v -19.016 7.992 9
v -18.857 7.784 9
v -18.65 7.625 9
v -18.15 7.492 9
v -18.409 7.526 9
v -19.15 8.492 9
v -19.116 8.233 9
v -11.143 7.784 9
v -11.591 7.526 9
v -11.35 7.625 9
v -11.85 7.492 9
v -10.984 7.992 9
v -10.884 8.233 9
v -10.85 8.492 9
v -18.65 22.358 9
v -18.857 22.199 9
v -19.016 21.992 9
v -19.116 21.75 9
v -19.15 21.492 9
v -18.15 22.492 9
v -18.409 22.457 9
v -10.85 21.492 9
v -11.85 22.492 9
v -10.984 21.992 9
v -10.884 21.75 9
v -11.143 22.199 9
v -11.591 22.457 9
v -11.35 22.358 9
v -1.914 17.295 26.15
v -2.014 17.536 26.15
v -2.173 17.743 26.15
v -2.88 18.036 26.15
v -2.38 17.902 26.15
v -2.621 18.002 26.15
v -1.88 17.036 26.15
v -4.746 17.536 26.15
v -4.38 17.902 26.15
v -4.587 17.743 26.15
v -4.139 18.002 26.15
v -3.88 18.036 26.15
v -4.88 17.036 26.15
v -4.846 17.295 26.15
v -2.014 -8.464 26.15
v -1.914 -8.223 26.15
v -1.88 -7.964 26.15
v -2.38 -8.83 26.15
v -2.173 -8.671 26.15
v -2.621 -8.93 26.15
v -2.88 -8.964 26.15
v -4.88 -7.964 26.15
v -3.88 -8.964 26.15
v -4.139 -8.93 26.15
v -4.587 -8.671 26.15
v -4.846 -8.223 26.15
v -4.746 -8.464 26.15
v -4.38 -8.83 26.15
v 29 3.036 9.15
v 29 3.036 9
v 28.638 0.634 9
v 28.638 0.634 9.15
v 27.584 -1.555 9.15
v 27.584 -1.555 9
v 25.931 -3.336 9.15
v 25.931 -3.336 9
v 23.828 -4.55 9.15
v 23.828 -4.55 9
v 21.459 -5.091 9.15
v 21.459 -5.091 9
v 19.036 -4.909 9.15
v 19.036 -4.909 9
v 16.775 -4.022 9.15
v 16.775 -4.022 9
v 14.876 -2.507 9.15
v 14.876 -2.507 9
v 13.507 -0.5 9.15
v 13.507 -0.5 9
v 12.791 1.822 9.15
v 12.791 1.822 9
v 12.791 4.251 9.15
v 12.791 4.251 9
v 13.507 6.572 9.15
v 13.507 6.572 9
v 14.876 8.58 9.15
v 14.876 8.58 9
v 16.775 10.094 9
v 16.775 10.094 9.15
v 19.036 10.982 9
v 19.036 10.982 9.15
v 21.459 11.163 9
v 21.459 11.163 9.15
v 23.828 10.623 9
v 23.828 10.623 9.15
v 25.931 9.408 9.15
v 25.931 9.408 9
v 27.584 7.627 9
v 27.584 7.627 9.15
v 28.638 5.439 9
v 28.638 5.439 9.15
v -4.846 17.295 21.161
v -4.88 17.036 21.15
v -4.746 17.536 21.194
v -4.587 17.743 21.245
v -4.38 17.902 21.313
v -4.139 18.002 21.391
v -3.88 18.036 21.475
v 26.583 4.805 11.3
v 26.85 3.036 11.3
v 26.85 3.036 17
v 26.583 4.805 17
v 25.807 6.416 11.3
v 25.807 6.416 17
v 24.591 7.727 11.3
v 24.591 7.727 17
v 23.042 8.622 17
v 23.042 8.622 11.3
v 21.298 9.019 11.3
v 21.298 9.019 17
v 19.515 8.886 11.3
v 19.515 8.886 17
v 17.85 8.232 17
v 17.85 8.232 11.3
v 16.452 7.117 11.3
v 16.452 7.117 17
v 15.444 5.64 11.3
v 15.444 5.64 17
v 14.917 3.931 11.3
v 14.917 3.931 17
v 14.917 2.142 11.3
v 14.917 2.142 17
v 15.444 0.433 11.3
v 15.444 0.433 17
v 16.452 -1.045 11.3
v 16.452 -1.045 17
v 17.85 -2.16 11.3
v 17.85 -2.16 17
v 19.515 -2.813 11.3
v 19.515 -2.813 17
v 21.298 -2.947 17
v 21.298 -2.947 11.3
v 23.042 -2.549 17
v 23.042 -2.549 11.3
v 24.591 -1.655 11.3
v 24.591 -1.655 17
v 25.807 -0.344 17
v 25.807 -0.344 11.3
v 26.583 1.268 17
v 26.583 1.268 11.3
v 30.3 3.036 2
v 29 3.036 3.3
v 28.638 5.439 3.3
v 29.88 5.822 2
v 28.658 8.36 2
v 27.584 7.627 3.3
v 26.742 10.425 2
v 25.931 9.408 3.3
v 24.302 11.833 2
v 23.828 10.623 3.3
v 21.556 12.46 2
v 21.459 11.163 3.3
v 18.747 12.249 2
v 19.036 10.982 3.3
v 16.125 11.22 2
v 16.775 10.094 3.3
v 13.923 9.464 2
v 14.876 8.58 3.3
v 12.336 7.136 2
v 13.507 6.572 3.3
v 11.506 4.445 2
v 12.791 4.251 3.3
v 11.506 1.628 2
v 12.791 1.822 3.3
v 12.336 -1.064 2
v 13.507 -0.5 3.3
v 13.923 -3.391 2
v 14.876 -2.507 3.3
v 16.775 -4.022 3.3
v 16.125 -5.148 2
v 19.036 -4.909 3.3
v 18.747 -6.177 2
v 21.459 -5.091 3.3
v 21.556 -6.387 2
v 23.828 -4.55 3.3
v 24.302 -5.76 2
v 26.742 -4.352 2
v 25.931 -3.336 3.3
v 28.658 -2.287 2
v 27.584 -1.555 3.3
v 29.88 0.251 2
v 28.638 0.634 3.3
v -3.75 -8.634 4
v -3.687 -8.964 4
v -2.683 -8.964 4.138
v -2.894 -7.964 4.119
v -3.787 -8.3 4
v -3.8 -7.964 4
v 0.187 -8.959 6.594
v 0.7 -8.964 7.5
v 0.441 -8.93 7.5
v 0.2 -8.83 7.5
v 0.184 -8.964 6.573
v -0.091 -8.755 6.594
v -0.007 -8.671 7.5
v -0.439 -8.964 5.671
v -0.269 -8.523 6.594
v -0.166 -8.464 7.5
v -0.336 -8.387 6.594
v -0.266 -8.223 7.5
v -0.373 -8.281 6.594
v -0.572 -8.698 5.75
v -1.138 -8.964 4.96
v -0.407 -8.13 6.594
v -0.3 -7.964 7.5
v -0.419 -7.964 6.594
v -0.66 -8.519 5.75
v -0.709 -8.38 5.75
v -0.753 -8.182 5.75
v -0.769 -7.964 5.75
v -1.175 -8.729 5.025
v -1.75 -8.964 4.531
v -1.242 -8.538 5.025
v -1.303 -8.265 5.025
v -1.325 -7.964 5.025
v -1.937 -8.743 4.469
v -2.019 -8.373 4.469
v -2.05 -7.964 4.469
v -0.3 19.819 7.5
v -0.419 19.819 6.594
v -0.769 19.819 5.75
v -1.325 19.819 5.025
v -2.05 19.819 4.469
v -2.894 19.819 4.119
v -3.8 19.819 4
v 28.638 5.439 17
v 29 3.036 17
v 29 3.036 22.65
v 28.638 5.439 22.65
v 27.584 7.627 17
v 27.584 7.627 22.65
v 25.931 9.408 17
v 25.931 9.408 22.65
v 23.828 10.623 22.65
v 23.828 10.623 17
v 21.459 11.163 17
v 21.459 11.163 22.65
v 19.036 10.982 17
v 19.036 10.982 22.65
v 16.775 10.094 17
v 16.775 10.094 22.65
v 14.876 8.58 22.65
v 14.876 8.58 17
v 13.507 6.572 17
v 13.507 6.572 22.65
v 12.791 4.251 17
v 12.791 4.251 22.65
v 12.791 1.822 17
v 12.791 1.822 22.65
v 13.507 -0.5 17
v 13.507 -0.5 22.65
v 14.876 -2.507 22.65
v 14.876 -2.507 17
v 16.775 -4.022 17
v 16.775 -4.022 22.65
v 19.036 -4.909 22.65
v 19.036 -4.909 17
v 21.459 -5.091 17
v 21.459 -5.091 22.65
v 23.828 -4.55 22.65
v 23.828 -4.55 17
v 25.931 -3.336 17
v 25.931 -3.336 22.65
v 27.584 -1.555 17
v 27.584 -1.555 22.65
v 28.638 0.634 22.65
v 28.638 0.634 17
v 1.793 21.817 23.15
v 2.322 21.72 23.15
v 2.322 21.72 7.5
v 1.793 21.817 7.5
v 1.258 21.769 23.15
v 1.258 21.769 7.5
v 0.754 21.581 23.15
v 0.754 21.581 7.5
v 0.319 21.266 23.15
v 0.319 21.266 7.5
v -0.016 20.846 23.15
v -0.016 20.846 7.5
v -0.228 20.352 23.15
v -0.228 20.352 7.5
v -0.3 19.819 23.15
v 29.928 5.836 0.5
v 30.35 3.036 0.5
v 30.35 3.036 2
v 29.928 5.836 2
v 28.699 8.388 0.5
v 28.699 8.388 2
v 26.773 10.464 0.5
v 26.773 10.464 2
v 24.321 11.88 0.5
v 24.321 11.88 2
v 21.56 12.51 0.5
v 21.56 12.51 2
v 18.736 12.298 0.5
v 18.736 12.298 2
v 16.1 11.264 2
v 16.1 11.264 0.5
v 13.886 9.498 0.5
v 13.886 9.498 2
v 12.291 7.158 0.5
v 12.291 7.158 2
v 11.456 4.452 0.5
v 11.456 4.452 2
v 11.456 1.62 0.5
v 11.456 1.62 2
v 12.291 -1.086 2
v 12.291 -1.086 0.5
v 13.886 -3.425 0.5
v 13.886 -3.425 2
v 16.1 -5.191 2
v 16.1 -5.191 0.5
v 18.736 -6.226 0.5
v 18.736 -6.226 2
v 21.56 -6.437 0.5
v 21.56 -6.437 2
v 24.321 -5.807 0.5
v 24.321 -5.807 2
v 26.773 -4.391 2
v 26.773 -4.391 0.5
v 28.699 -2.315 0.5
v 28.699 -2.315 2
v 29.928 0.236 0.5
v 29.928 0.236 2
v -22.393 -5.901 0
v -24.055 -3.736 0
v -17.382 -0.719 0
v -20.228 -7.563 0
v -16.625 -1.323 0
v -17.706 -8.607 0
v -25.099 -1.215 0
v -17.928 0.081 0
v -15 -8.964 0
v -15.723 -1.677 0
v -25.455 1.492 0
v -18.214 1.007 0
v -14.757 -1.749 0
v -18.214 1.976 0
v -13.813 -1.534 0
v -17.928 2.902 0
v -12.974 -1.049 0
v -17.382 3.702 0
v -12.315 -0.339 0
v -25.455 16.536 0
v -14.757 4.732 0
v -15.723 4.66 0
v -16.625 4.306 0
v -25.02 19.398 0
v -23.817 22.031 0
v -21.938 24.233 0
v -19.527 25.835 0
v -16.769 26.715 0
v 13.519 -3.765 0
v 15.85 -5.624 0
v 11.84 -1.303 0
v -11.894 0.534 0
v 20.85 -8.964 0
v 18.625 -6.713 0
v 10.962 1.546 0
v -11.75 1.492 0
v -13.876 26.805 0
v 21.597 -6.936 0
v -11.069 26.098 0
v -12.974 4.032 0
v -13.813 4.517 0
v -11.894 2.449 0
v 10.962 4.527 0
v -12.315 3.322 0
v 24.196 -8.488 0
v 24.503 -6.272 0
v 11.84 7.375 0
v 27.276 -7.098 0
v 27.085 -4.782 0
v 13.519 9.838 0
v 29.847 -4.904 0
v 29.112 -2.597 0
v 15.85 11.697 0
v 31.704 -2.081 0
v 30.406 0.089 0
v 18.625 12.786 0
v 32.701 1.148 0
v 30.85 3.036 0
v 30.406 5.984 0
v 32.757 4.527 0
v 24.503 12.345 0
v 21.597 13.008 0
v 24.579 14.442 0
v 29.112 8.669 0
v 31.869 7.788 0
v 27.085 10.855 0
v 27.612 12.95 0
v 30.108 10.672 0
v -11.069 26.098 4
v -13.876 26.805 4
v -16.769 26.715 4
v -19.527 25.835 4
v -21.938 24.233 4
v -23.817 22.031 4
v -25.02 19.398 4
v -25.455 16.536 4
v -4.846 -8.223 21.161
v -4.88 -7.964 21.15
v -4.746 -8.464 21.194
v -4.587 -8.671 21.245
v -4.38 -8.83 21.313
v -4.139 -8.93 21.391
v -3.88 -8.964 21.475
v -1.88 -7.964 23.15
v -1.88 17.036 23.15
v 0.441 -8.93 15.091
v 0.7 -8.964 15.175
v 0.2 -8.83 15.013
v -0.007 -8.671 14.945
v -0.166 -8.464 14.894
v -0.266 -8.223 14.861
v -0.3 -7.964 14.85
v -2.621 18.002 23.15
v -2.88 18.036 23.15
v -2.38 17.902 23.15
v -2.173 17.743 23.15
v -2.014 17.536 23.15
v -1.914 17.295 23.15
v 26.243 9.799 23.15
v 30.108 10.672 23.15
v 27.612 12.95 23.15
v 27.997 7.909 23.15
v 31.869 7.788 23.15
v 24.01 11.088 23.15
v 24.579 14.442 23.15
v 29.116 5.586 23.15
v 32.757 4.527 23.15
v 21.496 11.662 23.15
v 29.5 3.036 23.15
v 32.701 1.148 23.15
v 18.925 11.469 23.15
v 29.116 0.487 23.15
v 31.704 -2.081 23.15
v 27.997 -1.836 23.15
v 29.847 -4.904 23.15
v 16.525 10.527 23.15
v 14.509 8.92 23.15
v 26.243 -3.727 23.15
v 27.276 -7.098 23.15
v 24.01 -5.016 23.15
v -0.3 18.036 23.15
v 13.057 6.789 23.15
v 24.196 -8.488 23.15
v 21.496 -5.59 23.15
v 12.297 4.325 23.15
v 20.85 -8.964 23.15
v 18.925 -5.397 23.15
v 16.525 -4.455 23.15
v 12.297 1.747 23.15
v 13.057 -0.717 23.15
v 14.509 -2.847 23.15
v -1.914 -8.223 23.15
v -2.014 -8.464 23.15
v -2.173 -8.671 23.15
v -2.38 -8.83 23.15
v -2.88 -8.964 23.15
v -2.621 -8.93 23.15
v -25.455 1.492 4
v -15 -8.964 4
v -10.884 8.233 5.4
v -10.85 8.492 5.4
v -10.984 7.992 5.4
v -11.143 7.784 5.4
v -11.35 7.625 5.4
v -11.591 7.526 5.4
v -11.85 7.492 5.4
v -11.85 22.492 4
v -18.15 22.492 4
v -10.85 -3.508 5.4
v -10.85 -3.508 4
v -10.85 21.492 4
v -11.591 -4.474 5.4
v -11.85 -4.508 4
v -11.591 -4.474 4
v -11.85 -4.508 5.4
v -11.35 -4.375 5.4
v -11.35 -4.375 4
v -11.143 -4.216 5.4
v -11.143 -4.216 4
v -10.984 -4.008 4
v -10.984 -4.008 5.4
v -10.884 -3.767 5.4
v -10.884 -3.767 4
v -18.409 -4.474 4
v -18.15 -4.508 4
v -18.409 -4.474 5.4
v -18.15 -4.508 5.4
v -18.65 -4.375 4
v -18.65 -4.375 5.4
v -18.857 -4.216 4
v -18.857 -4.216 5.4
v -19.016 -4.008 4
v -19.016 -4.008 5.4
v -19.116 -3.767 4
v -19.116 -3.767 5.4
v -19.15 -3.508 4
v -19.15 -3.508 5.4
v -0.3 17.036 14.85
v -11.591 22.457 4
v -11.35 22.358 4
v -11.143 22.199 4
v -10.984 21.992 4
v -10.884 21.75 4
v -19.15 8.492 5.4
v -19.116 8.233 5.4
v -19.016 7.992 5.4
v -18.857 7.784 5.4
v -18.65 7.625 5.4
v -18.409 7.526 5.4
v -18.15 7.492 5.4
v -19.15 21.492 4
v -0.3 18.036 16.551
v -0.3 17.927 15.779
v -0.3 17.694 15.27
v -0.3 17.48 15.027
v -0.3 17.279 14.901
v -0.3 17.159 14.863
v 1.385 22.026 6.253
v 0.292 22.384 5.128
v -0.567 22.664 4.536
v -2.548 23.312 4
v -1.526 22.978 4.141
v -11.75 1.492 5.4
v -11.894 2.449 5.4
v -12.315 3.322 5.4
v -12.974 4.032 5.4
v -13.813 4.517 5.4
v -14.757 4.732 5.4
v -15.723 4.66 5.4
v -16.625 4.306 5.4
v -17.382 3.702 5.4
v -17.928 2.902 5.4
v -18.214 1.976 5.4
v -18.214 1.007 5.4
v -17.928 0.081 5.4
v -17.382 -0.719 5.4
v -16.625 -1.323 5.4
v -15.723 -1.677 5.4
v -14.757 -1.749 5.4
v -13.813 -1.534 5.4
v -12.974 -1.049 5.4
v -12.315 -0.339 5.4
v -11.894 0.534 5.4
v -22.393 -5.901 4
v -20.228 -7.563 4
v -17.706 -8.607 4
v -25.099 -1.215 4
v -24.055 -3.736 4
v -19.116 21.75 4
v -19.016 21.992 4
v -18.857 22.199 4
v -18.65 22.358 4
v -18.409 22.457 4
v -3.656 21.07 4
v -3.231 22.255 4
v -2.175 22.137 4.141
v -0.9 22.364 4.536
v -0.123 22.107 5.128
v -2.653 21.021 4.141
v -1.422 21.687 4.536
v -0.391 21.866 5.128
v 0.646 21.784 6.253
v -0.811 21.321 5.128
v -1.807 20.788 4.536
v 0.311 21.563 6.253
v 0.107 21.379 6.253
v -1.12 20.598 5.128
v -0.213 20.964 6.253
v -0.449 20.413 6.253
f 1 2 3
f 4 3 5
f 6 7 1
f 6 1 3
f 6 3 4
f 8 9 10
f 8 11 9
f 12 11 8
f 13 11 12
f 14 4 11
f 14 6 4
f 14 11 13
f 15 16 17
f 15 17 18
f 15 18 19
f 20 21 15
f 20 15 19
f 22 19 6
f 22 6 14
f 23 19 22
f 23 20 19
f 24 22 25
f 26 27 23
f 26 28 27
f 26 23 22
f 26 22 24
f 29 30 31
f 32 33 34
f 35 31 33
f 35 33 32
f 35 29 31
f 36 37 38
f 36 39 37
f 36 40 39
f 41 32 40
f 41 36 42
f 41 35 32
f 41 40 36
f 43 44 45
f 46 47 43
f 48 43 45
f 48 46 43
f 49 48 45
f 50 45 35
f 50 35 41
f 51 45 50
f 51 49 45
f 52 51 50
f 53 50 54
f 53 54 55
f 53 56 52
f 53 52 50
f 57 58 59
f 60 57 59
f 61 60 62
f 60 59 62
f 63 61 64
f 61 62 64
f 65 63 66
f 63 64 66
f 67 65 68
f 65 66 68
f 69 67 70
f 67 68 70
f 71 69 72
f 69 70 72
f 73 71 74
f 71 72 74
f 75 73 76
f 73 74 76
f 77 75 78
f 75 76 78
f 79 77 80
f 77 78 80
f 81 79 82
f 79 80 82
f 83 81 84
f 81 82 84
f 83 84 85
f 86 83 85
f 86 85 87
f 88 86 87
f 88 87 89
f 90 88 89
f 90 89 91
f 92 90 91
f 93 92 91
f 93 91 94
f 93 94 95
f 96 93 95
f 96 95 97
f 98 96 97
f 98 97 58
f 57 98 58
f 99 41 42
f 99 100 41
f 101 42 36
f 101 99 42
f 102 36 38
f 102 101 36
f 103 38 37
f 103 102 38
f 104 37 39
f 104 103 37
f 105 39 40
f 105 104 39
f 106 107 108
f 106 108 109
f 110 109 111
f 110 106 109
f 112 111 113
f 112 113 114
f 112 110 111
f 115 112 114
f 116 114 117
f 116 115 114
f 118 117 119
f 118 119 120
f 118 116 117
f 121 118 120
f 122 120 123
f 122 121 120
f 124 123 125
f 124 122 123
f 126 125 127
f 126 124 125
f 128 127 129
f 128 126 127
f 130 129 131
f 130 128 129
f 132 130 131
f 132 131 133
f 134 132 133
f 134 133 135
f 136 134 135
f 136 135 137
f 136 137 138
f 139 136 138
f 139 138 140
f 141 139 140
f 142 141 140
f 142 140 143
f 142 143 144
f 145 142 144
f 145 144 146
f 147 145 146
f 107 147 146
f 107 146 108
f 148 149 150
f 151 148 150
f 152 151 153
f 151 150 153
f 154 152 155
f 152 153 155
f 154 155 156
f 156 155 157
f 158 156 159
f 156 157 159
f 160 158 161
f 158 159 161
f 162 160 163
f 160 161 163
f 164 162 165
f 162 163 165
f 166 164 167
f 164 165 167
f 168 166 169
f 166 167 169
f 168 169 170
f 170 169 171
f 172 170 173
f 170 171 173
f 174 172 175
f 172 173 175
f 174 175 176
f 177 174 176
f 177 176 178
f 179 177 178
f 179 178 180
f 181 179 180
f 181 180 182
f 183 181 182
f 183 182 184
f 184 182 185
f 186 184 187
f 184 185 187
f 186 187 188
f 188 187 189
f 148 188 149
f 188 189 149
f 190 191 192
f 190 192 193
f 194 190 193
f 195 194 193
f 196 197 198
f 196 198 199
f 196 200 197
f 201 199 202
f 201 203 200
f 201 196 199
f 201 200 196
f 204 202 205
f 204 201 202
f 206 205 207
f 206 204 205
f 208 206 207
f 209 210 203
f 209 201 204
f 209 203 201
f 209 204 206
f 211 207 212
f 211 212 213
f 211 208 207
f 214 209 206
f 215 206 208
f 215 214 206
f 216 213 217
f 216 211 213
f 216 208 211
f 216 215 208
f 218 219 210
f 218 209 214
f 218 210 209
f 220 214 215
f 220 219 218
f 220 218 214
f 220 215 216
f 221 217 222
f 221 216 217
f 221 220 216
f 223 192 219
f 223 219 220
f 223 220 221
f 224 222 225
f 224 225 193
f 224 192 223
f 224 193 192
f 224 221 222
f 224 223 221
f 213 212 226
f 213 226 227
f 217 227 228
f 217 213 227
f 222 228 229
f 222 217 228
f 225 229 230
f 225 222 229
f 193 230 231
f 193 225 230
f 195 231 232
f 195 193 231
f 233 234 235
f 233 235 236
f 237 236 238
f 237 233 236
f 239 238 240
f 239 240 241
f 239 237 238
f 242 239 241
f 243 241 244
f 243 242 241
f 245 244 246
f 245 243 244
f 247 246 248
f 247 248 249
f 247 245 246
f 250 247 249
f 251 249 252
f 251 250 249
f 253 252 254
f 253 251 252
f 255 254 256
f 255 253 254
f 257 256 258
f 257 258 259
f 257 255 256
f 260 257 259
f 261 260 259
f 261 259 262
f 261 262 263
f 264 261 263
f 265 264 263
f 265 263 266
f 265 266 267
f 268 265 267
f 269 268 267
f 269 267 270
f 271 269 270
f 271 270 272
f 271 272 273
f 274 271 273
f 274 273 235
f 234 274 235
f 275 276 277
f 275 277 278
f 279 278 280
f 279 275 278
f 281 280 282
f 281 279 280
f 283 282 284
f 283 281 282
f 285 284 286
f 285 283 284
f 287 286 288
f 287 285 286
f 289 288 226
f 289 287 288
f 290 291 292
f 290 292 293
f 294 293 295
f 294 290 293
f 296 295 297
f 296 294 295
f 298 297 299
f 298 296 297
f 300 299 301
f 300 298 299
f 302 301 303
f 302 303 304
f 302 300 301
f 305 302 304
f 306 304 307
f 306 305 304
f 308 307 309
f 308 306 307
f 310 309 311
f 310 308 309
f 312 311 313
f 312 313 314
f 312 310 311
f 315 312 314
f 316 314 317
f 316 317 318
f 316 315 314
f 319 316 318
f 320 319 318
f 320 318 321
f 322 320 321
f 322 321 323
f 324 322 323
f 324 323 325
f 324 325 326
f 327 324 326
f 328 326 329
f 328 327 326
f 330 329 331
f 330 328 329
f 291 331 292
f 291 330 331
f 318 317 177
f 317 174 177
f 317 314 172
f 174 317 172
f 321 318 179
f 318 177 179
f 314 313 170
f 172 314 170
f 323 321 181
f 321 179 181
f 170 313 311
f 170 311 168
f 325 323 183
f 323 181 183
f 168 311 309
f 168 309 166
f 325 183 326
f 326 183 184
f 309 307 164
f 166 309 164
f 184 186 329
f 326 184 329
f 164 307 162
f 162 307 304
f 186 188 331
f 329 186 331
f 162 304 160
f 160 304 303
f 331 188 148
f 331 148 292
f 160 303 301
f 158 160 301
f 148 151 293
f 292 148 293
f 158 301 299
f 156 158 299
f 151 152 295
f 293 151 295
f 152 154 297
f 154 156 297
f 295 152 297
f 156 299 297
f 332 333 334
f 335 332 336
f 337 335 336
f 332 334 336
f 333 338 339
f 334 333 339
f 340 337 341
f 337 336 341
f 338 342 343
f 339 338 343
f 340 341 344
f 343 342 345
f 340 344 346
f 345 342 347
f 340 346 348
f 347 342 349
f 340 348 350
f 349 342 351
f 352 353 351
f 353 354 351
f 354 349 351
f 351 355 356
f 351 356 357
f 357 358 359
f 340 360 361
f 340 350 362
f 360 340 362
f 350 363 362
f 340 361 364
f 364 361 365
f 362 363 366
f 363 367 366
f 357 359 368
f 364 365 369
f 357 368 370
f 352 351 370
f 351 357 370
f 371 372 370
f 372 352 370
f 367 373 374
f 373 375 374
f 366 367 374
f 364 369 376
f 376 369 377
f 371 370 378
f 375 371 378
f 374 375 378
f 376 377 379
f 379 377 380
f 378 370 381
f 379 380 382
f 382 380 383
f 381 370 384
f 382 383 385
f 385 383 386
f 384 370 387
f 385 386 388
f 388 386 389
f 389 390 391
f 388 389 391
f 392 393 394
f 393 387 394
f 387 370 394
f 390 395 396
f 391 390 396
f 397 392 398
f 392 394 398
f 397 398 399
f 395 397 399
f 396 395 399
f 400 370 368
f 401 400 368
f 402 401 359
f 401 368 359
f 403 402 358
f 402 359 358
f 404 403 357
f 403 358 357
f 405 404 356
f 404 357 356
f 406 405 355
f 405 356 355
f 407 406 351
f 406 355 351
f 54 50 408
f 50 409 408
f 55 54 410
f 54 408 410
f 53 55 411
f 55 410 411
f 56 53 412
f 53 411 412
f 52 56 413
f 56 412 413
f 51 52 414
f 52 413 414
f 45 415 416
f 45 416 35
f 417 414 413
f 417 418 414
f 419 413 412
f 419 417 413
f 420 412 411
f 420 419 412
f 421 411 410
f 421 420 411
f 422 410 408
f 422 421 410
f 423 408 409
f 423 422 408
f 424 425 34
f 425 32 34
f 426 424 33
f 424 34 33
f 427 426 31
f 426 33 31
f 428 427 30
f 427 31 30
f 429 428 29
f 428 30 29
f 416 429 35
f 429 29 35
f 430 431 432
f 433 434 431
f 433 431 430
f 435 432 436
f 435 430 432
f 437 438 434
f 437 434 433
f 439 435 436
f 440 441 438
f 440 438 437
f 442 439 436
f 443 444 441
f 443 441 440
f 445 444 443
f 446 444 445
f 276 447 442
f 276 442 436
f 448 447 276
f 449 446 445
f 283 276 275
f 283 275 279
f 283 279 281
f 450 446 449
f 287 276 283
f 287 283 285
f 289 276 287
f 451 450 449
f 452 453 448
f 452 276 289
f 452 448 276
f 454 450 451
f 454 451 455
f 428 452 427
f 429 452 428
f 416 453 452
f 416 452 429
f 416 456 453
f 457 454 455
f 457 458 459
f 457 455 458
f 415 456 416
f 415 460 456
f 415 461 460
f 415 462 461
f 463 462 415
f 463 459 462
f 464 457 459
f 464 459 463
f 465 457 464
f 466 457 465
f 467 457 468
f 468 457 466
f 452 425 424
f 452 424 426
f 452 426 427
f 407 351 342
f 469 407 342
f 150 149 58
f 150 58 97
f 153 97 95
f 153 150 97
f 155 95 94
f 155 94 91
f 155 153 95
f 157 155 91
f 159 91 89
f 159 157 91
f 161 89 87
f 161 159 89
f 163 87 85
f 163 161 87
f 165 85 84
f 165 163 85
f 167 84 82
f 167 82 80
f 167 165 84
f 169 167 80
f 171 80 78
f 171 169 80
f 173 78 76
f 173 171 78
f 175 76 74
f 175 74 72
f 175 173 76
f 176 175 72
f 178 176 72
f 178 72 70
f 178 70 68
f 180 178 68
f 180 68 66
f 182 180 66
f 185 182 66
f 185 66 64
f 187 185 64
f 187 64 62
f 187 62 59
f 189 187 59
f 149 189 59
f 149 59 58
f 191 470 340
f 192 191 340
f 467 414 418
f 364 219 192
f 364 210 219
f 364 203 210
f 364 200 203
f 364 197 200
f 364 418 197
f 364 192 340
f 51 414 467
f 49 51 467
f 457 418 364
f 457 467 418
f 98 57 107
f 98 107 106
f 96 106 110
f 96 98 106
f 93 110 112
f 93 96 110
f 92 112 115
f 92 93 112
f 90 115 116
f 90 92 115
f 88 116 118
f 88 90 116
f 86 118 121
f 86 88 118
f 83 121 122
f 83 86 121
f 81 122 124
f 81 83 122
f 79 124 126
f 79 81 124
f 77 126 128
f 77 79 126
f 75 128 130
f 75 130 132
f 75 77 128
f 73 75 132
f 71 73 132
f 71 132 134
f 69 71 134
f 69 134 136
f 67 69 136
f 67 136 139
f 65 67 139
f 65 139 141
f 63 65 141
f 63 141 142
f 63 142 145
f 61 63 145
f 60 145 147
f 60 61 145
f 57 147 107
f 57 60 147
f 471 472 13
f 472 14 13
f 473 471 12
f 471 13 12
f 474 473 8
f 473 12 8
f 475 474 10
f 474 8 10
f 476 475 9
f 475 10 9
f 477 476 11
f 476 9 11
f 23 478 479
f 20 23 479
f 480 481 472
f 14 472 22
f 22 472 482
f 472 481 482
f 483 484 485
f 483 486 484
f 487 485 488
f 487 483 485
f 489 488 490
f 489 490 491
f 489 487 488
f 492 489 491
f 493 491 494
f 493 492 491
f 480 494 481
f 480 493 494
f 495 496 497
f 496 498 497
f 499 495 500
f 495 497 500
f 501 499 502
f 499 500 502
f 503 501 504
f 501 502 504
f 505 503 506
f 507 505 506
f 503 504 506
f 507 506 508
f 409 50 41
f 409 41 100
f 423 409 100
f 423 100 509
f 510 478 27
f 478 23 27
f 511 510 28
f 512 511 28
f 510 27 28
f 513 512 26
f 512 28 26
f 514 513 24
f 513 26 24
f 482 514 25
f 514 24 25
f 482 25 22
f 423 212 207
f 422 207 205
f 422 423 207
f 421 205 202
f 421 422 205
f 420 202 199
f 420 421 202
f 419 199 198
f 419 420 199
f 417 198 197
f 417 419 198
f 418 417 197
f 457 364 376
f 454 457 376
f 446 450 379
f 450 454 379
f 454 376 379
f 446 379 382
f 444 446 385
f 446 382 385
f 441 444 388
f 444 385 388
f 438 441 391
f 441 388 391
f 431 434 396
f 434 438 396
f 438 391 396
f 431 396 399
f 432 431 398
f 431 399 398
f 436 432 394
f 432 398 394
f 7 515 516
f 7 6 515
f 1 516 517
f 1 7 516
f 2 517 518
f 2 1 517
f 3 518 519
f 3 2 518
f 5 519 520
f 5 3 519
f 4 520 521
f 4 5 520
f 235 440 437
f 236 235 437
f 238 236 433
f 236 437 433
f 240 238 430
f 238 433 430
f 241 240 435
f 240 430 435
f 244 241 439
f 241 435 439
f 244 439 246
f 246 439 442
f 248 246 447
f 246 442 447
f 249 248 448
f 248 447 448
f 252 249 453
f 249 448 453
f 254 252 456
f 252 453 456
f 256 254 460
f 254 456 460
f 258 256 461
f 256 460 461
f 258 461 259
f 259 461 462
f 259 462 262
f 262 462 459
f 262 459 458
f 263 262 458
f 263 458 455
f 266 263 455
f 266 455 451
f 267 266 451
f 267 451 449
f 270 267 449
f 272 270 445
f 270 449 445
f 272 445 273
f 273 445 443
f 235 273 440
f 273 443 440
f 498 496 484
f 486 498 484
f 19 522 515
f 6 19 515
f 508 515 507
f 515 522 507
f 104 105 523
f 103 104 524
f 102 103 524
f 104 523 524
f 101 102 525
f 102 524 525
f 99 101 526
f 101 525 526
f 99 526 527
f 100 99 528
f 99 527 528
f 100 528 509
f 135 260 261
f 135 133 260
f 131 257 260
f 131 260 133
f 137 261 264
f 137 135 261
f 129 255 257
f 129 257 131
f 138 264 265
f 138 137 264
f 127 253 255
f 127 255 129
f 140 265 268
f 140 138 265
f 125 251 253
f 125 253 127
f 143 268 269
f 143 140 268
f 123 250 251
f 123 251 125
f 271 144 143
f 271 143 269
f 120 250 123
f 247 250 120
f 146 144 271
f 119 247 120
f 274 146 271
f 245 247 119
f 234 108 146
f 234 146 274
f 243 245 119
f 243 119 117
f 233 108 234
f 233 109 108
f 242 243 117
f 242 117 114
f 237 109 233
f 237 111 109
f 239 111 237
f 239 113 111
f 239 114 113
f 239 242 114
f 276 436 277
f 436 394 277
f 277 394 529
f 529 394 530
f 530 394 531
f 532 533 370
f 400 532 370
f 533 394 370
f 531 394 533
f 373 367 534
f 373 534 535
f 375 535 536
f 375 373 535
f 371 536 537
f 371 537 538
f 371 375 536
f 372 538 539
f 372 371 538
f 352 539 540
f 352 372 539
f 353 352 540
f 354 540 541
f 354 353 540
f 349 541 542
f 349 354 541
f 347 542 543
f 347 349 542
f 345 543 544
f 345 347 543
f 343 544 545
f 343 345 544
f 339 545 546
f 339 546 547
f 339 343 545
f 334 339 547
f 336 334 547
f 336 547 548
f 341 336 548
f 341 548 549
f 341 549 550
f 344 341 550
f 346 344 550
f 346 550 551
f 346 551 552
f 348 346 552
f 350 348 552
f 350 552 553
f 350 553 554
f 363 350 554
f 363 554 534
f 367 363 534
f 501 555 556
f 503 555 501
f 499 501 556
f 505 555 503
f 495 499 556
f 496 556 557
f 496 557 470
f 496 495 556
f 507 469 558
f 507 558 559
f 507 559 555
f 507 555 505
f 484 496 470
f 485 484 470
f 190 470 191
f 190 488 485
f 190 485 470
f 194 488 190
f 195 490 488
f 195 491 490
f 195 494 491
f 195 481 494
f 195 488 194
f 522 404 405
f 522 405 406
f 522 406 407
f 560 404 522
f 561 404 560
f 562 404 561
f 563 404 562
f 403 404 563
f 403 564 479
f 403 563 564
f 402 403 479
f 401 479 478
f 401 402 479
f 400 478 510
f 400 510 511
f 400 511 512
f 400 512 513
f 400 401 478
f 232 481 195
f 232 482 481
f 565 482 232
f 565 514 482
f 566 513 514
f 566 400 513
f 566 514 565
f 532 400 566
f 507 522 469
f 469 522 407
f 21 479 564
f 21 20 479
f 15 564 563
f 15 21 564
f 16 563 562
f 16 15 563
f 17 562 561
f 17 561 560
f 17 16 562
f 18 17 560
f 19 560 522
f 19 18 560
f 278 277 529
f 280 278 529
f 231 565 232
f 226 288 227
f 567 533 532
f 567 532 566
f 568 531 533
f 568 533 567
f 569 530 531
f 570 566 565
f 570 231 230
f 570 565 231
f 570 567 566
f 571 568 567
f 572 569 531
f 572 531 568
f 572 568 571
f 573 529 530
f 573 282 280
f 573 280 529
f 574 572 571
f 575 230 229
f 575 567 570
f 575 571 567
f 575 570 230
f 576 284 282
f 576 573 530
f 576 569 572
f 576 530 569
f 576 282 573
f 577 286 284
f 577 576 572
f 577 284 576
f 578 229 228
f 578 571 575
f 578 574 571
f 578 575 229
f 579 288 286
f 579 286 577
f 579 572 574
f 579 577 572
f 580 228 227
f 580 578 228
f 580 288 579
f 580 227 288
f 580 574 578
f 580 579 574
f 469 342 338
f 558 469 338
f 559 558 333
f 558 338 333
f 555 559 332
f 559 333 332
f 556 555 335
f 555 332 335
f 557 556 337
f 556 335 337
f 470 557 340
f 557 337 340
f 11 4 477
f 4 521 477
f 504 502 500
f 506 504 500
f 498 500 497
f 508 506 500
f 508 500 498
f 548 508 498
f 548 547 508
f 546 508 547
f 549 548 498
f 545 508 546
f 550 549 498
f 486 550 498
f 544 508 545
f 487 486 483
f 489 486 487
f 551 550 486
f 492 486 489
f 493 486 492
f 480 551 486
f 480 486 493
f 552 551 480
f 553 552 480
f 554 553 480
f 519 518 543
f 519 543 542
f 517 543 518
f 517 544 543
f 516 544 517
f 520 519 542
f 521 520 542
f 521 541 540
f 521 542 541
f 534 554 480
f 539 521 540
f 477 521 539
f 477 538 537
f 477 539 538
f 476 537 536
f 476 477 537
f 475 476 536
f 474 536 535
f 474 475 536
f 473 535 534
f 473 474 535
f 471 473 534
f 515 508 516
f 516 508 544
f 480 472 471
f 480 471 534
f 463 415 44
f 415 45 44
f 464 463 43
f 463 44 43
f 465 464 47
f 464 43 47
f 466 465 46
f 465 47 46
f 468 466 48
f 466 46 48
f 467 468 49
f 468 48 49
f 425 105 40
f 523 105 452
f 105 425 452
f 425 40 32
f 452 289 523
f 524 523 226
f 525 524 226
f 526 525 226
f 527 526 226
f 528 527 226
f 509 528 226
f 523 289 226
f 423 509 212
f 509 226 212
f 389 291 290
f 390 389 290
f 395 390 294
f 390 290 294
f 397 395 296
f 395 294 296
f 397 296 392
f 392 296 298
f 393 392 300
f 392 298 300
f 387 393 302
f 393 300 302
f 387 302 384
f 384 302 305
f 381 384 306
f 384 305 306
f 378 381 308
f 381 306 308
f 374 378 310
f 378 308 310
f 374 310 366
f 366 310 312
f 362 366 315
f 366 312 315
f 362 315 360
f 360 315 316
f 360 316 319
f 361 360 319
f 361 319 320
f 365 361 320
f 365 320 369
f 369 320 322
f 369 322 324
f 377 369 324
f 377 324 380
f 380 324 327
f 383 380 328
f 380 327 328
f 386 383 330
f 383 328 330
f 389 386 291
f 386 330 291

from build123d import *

# Parameters (mm, degrees)
SKETCH_1_R          = 3.2500000000000004
SKETCH_1_R_2        = 8.149999999999999
EXTRUDE_1_DEPTH     = 4
SKETCH_1_3_R        = 11.999999999999993
SKETCH_1_3_R_2      = 8.149999999999999
SKETCH_1_3_R_3      = 9.500000000000002
EXTRUDE_2_DEPTH     = 23.15
EXTRUDE_START       = 9
SKETCH_1_4_R        = 8.149999999999999
SKETCH_1_4_R_2      = 5.999999999999998
EXTRUDE_3_DEPTH     = 8
EXTRUDE_4_DEPTH     = 9.000000000000002
FILLET_1_R          = 2
EXTRUDE_5_DEPTH     = 27
FILLET_2_R          = 1
SKETCH_1_6_R        = 9.500000000000002
SKETCH_1_6_R_2      = 8.149999999999999
CUT_EXTRUDE_1_DEPTH = 2
CHAMFER_1_SIZE      = 2.3
CHAMFER_2_SIZE      = 1.3
FILLET_4_R          = 3.5
SKETCH_1_7_R        = 3.2500000000000004
EXTRUDE_6_DEPTH     = 5.4
FILLET_3_R          = 1
CHAMFER_3_SIZE      = 0.5


with BuildPart() as part:
    # Эскиз1 → Бобышка-Вытянуть1 (new body)
    with BuildSketch(Plane.XY):
        with BuildLine():
            Line((-14.999999999999972, -8.963730931198981), (20.850000000000577, -8.96373093119897))
            ThreePointArc((20.85000000000058, -8.963730931198967), (32.70050757538239, 1.1480237971749345), (24.57944414926456, 14.44202403449797))
            Line((24.57944414926456, 14.44202403449797), (-11.068586896529624, 26.098187192163547))
            ThreePointArc((-11.068586896529625, 26.098187192163547), (-20.788047002520305, 25.117990405859814), (-25.455246310980815, 16.536269068801015))
            Line((-25.455246310980815, 16.536269068801015), (-25.45524631098081, 1.4915153797818874))
            ThreePointArc((-25.45524631098081, 1.4915153797818874), (-22.392975565470174, -5.9014601856883235), (-14.999999999999972, -8.96373093119898))
        make_face()
        Polygon((-10.849999999999971, 7.491515379781886), (-19.149999999999974, 7.491515379781886), (-19.149999999999974, 22.491515379781884), (-10.849999999999973, 22.491515379781884), align=None, mode=Mode.SUBTRACT)
        with Locations((-14.999999999999972, 1.4915153797818852)):
            Circle(SKETCH_1_R, mode=Mode.SUBTRACT)
        with Locations((20.85000000000058, 3.036269068801026)):
            Circle(SKETCH_1_R_2, mode=Mode.SUBTRACT)
    extrude(amount=EXTRUDE_1_DEPTH)

    # Эскиз1<3> → Бобышка-Вытянуть2 (add)
    # profile 1 of 3: a face of its own
    with BuildSketch(Plane.XY):
        with BuildLine():
            Line((-0.29999999999996874, -8.96373093119897), (20.85000000000058, -8.96373093119897))
            ThreePointArc((20.850000000000577, -8.963730931198967), (8.999492424618776, 4.924514340427118), (24.57944414926456, 14.44202403449797))
            Line((24.57944414926456, 14.442024034497972), (-0.2999999999999723, 22.57708372133782))
            Line((-0.2999999999999722, 22.57708372133782), (-0.2999999999999704, -8.96373093119897))
        make_face()
    # profile 2 of 3: a face of its own
    with BuildSketch(Plane.XY):
        with Locations((20.85000000000058, 3.036269068801026)):
            Circle(SKETCH_1_3_R)
        with Locations((20.85000000000058, 3.036269068801026)):
            Circle(SKETCH_1_3_R_2, mode=Mode.SUBTRACT)
    # profile 3 of 3: a face of its own
    with BuildSketch(Plane.XY):
        with Locations((20.85000000000058, 3.036269068801026)):
            Circle(SKETCH_1_3_R_3)
        with Locations((20.85000000000058, 3.036269068801026)):
            Circle(SKETCH_1_3_R_2, mode=Mode.SUBTRACT)
    extrude(amount=EXTRUDE_2_DEPTH)

    # Эскиз1<4> → Бобышка-Вытянуть3 (add)
    with BuildSketch(Plane.XY.offset(EXTRUDE_START)):
        with Locations((20.85000000000058, 3.036269068801026)):
            Circle(SKETCH_1_4_R)
        with Locations((20.85000000000058, 3.036269068801026)):
            Circle(SKETCH_1_4_R_2, mode=Mode.SUBTRACT)
    extrude(amount=EXTRUDE_3_DEPTH)

    # Эскиз1<5> → Бобышка-Вытянуть4 (add)
    with BuildSketch(Plane.XY):
        Polygon((-10.849999999999971, 7.491515379781886), (-10.849999999999973, 22.491515379781884), (-19.149999999999974, 22.491515379781884), (-19.149999999999974, 7.491515379781886), align=None)
    extrude(amount=EXTRUDE_4_DEPTH)

    # Скругление1
    fillet_1_edges = [part.edges().sort_by_distance(p)[0] for p in [
        (-0.29999999999997223, 22.57708372133782, 13.575),
    ]]
    fillet(fillet_1_edges, radius=FILLET_1_R)

    # Эскиз4 → Бобышка-Вытянуть5 (add)
    with BuildSketch(Plane.XZ.offset(8.96373093119897)):
        Polygon((-4.879999999999971, 26.15), (-4.87999999999997, 21.15), (-0.2999999999999704, 14.85), (-0.2999999999999704, 23.150000000000002), (-1.8799999999999704, 23.150000000000002), (-1.8799999999999704, 26.15), align=None)
    extrude(amount=-EXTRUDE_5_DEPTH)

    # Скругление2
    fillet_2_edges = [part.edges().sort_by_distance(p)[0] for p in [
        (-0.29999999999996957, -8.96373093119897, 9.425),
        (-2.589999999999968, 18.03626906880103, 18),
        (-4.879999999999969, 18.03626906880103, 23.65),
        (-1.8799999999999681, 18.03626906880103, 24.65),
        (-2.58999999999997, -8.96373093119897, 18),
        (-1.8799999999999704, -8.96373093119897, 24.65),
        (-4.879999999999971, -8.96373093119897, 23.65),
    ]]
    fillet(fillet_2_edges, radius=FILLET_2_R)

    # Эскиз1<6> → Вырез-Вытянуть1 (cut)
    with BuildSketch(Plane.XY):
        with Locations((20.85000000000058, 3.036269068801026)):
            Circle(SKETCH_1_6_R)
        with Locations((20.85000000000058, 3.036269068801026)):
            Circle(SKETCH_1_6_R_2, mode=Mode.SUBTRACT)
    extrude(amount=CUT_EXTRUDE_1_DEPTH, mode=Mode.SUBTRACT)

    # Фаска1
    # the kernel refuses this chamfer: 2.3 mm, written as the material it takes off along each edge
    with BuildSketch(Plane(origin=(20.85000000000058, 3.036269068801026, 9), x_dir=(1, 0, 0), z_dir=(0, -1, 0))) as chamfer_1_piece_1_section:
        Polygon((5.9999999999999964, CHAMFER_1_SIZE), (5.9999999999999964 + CHAMFER_1_SIZE, 0), (5.9999999999999964, 0), align=None)
    chamfer_1_piece_1 = revolve(axis=Axis((20.85000000000058, 3.036269068801026, 9), (0, 0, 1)), mode=Mode.PRIVATE)
    chamfer_1_piece_1 = chamfer_1_piece_1 & Plane(origin=(20.85000000000058, 3.036269068801026, 10.222457747954977), x_dir=(1, 0, 0), z_dir=(0, 0, -1)) * Cylinder(8.149999999999999, 34, mode=Mode.PRIVATE)
    add(chamfer_1_piece_1, mode=Mode.SUBTRACT)

    # Фаска2
    chamfer_2_edges = [part.edges().sort_by_distance(p)[0] for p in [
        (12.700000000000582, 3.036269068801027, 2),
    ]]
    chamfer(chamfer_2_edges, length=CHAMFER_2_SIZE)

    # Скругление4
    # the kernel refuses this fillet: 3.5 mm, written as the material it adds along each edge
    with BuildSketch(Plane(origin=(0.7000000000000293, -7.963730931198976, 4), x_dir=(-0.9999802608561372, 0.006283143965558403, 0), z_dir=(-0.006283143965558403, -0.9999802608561372, 0))) as fillet_4_piece_1_section:
        with BuildLine():
            CenterArc((-0.9999999999999992 - FILLET_4_R, -FILLET_4_R), FILLET_4_R, 0, 90)
            Line((-0.9999999999999979, -FILLET_4_R), (-0.9999999999999992, 0))
            Line((-0.9999999999999992, 0), (-0.9999999999999992 - FILLET_4_R, 0))
        make_face()
    fillet_4_piece_1 = revolve(axis=Axis((0.7000000000000293, -7.963730931198976, 4), (0, 0, -1)), revolution_arc=359.64000000000004, mode=Mode.PRIVATE)
    fillet_4_piece_1 = split(fillet_4_piece_1, bisect_by=Plane(origin=(-0.06522476751896455, -8.963730931198977, 5.353005928395178), z_dir=(-3e-16, 1, 0)), keep=Keep.TOP, mode=Mode.PRIVATE)
    add(fillet_4_piece_1)
    with BuildSketch(Plane(origin=(-0.2999999999999705, -7.963730931198976, 4), x_dir=(-1, -6e-17, 0), z_dir=(-6e-17, 1, 0))) as fillet_4_piece_2:
        with BuildLine():
            CenterArc((FILLET_4_R, FILLET_4_R), FILLET_4_R, 180, 90)
            Line((-4.4e-16, FILLET_4_R), (0, 0))
            Line((0, 0), (FILLET_4_R, 0))
        make_face()
    extrude(amount=27.782655425625357)
    with BuildSketch(Plane(origin=(1.7000000000000277, 19.818924494426383, 4), x_dir=(-0.9998226837850567, -0.018830852047809543, 0), z_dir=(-0.018830852047809543, 0.9998226837850567, 0))) as fillet_4_piece_3_section:
        with BuildLine():
            CenterArc((-2.000000000000004 - FILLET_4_R, FILLET_4_R), FILLET_4_R, 270, 90)
            Line((-2.000000000000004, FILLET_4_R), (-2.000000000000004, 0))
            Line((-2.000000000000004, 0), (-2.000000000000004 - FILLET_4_R, 0))
        make_face()
    fillet_4_piece_3 = revolve(axis=Axis((1.7000000000000277, 19.818924494426383, 4), (0, 0, 1)), revolution_arc=358.921007878005, mode=Mode.PRIVATE)
    fillet_4_piece_3 = split(fillet_4_piece_3, bisect_by=Plane(origin=(0.6026329252520348, 22.28194156791278, 5.095559189965934), z_dir=(-0.3107870124386654, -0.950479580474746, 0)), keep=Keep.TOP, mode=Mode.PRIVATE)
    add(fillet_4_piece_3)

    # Эскиз1<7> → Бобышка-Вытянуть6 (add)
    with BuildSketch(Plane.XY):
        Polygon((-10.849999999999971, 7.491515379781886), (-19.149999999999974, 7.491515379781886), (-19.149999999999974, -4.508484620218114), (-10.849999999999971, -4.508484620218115), align=None)
        with Locations((-14.999999999999972, 1.4915153797818852)):
            Circle(SKETCH_1_7_R, mode=Mode.SUBTRACT)
    extrude(amount=EXTRUDE_6_DEPTH)

    # Скругление3
    fillet_3_edges = [part.edges().sort_by_distance(p)[0] for p in [
        (-19.149999999999974, -4.508484620218114, 4.7),
        (-10.849999999999971, -4.508484620218114, 4.7),
        (-19.149999999999974, 22.491515379781884, 6.500000000000001),
        (-19.149999999999974, 7.491515379781886, 7.200000000000001),
        (-10.849999999999971, 7.491515379781886, 7.200000000000001),
        (-10.849999999999973, 22.491515379781884, 6.500000000000001),
    ]]
    fillet(fillet_3_edges, radius=FILLET_3_R)

    # Фаска3
    chamfer_3_edges = [part.edges().sort_by_distance(p)[0] for p in [
        (11.350000000000579, 3.0362690688010274, 0),
        (12.700000000000582, 3.036269068801027, 23.15),
    ]]
    chamfer(chamfer_3_edges, length=CHAMFER_3_SIZE)


solid = part.part
